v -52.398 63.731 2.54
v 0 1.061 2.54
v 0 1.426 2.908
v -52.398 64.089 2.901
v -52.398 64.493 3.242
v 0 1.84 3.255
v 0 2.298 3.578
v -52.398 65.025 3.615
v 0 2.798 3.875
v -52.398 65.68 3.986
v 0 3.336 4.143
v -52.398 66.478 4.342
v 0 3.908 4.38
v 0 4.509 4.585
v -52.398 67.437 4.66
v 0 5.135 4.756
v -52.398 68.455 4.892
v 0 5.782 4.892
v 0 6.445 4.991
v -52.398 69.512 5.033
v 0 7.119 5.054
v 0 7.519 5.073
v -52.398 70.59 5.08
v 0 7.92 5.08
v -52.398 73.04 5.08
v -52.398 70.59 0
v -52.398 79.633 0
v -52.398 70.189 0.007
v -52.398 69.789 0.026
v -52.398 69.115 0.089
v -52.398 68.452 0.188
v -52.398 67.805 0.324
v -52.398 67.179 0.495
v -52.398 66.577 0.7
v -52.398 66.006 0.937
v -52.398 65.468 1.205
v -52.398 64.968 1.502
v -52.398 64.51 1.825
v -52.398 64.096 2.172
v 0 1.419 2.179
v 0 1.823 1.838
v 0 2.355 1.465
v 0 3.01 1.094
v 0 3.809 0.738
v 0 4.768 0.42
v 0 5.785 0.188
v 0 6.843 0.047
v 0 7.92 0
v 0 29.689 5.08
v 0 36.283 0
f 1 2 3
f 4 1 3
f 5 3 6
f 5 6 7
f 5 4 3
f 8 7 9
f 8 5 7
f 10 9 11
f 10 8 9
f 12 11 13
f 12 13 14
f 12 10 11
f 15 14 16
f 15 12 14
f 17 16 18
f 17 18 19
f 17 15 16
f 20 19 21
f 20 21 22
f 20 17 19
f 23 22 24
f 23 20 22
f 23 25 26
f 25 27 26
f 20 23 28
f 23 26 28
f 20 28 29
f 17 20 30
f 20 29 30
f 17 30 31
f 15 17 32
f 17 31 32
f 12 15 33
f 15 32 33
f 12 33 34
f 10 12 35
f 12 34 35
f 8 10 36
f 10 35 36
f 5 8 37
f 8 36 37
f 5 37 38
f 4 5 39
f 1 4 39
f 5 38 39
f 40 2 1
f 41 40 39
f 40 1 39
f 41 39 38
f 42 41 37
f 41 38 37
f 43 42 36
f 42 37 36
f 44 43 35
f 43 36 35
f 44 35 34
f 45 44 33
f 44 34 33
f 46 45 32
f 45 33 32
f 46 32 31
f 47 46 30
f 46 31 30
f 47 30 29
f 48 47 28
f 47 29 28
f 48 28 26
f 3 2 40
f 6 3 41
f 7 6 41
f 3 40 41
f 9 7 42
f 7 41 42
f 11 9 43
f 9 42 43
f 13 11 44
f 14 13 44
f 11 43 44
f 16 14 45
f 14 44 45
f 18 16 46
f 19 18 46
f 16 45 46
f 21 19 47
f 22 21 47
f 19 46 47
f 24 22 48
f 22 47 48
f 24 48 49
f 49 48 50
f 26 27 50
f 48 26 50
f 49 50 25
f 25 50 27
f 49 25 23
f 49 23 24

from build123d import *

# Parameters (mm, degrees)
F1_DEPTH    = 5.08
F2_T1_DEPTH = 107.0884939123
F3_SIZE     = 5.07999


# Not quite as in the source:
# - a fillet or chamfer that OpenCascade refuses, or shapes differently, is made with other operations: its cross-section is extruded or revolved along the edge and cut away or added
# - a fillet or chamfer is up to 0.001 mm smaller than in the source, because OpenCascade refuses the exact size


with BuildPart() as f1:
    # F0 (on Top) → F1 (new body)
    with BuildSketch(Plane.XY):
        Polygon((-52.3975975811, 62.6697838306), (0, 0), (0, 36.2825095654), (-52.3975975811, 79.6330347657), align=None)
    extrude(amount=F1_DEPTH)

    # F2: fillet of radius 5.08 on 2 edges, made by hand

    # F2_s2 → F2_t1 (cut)
    with BuildSketch(Plane(origin=(-60.5437814243, 72.412970619, 0), x_dir=(0, 0, 1), z_dir=(0.6414317987, -0.7671800621, 0))):
        with BuildLine():
            ThreePointArc((0, 0), (3.5921024484, -1.4878975516), (5.08, -5.08))
            Line((5.08, -5.08), (5.08, 0))
            Line((5.08, 0), (0, 0))
        make_face()
        with BuildLine():
            ThreePointArc((5.08, 0), (1.4878975516, -1.4878975516), (0, -5.08))
            Line((0, -5.08), (0, 0))
            Line((0, 0), (5.08, 0))
        make_face()
    extrude(amount=F2_T1_DEPTH, mode=Mode.SUBTRACT)

    # F3 (size 5.08 in the source; OpenCascade refuses exactly that, so slightly less here)
    f3_edges = [f1.edges().sort_by_distance(p)[0] for p in [
        (-26.198799, 57.957772, 5.08),
    ]]
    chamfer(f3_edges, length=F3_SIZE)


solid = f1.part
